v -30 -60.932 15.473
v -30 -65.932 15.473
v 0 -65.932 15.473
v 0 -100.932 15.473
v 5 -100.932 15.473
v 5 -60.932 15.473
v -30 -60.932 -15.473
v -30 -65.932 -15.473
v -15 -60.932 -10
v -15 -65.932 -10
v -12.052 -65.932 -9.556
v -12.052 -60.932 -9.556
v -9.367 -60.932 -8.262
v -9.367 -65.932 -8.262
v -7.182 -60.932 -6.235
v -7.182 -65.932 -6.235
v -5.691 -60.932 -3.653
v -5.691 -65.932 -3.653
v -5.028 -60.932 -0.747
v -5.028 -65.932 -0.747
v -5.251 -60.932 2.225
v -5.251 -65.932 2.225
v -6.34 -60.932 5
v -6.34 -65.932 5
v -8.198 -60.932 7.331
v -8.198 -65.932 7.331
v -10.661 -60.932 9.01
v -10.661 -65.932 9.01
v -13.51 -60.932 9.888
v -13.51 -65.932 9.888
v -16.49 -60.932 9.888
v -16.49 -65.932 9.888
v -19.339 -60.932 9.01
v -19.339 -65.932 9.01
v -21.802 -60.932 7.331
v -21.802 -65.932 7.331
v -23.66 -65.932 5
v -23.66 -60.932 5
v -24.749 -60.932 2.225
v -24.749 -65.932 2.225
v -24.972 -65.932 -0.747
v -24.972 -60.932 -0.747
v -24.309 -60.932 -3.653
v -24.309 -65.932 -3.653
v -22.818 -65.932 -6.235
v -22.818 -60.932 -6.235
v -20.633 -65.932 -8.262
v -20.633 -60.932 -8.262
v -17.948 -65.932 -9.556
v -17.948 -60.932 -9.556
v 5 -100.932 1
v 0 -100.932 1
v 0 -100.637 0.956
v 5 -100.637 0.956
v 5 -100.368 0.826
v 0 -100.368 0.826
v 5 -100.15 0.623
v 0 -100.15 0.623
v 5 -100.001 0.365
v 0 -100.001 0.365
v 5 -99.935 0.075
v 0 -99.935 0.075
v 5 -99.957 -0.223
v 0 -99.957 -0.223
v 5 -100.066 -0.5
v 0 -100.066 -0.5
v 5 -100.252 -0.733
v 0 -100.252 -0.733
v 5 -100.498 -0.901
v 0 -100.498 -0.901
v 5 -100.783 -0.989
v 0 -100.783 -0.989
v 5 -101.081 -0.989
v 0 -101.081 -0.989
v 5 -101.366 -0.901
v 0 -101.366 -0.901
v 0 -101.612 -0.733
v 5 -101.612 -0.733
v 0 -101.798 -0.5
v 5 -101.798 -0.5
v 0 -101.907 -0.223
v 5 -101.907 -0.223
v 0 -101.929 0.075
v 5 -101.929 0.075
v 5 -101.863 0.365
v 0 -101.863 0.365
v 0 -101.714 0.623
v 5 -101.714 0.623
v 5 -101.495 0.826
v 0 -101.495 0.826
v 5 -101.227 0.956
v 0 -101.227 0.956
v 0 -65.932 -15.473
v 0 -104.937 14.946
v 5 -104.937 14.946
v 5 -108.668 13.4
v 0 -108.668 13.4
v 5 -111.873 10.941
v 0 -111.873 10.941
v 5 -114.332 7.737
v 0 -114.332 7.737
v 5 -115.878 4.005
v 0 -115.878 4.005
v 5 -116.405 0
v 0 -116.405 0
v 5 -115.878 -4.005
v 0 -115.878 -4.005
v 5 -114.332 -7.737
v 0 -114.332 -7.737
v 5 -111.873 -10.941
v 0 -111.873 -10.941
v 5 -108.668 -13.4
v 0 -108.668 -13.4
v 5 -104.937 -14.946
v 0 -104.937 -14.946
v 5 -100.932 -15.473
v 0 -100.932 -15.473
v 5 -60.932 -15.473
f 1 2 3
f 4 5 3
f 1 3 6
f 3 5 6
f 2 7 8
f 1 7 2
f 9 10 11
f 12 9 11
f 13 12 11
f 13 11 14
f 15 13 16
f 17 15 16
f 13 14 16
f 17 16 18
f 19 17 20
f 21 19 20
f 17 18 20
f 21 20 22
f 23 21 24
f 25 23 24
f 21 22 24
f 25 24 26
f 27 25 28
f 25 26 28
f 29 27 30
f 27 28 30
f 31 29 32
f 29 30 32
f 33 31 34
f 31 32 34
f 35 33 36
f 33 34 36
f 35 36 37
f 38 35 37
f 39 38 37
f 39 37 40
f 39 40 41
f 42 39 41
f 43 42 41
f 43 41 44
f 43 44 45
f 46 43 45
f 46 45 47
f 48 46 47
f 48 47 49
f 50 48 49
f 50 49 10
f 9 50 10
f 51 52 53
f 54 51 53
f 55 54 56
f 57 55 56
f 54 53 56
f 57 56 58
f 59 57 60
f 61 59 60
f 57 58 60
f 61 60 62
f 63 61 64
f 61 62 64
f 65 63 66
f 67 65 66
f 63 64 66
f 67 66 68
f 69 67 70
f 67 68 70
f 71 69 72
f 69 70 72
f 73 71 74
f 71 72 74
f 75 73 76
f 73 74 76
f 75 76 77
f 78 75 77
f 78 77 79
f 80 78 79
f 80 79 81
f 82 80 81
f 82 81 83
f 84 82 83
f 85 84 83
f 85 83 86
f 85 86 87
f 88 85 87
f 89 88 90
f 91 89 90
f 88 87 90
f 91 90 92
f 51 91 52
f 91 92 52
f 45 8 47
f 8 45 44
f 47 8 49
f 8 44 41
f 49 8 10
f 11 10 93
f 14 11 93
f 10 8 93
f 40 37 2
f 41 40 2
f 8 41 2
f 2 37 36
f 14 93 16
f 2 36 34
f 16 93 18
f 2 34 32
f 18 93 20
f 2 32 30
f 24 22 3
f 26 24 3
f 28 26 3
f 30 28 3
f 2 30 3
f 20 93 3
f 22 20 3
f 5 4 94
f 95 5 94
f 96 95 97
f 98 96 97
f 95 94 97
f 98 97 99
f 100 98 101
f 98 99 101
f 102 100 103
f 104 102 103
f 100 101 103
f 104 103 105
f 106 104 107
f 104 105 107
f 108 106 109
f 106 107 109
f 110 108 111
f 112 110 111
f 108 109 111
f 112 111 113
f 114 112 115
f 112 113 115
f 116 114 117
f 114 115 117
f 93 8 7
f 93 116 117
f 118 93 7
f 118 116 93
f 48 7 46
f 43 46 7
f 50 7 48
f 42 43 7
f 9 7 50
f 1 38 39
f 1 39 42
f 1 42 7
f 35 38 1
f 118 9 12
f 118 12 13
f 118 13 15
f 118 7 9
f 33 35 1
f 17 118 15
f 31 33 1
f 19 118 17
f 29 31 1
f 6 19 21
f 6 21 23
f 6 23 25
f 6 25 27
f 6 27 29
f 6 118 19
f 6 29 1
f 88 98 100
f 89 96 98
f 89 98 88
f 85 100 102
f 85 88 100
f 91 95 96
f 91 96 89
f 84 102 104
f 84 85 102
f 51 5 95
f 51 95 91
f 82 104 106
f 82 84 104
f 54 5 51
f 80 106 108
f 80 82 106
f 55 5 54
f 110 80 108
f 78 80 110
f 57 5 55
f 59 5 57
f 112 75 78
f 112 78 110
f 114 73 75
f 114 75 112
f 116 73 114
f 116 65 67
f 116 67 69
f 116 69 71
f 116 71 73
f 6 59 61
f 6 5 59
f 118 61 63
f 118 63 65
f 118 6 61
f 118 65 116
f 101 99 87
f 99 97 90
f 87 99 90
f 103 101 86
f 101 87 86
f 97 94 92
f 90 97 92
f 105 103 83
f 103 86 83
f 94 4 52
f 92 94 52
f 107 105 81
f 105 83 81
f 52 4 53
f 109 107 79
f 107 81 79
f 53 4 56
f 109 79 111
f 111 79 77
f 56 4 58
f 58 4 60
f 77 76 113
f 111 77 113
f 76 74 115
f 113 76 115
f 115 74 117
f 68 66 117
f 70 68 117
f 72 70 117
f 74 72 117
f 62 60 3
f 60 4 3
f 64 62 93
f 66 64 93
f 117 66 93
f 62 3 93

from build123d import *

# Parameters (mm, degrees)
BOSS_EXTRUDE2_DEPTH = 5
SKETCH5_R           = 1
CUT_EXTRUDE2_DEPTH  = 5
SKETCH6_W           = 30.946174702
SKETCH6_H           = 5
BOSS_EXTRUDE3_DEPTH = 30
SKETCH10_R          = 10
CUT_EXTRUDE3_DEPTH  = 30


with BuildPart() as part:
    # Sketch3 → Boss-Extrude2 (new body)
    with BuildSketch(Plane(origin=(0, 0, 0), x_dir=(0, 0, -1), z_dir=(1, 0, 0))):
        with BuildLine():
            Line((15.473087351, -60.931791337), (-15.473087351, -60.931791337))
            Line((-15.473087351, -60.931791337), (-15.473087351, -100.931791337))
            ThreePointArc((-15.473087351, -100.931791337), (0, -116.404878688), (15.473087351, -100.931791337))
            Line((15.473087351, -100.931791337), (15.473087351, -60.931791337))
        make_face()
    extrude(amount=BOSS_EXTRUDE2_DEPTH)

    # Sketch5 → Cut-Extrude2 (cut)
    with BuildSketch(Plane.ZY):
        with Locations((0, -100.931791337)):
            Circle(SKETCH5_R)
    extrude(amount=-CUT_EXTRUDE2_DEPTH, mode=Mode.SUBTRACT)

    # Sketch6 → Boss-Extrude3 (add)
    with BuildSketch(Plane.ZY):
        with Locations((0, -63.431791337)):
            Rectangle(SKETCH6_W, SKETCH6_H)
    extrude(amount=BOSS_EXTRUDE3_DEPTH)

    # Sketch10 → Cut-Extrude3 (cut)
    with BuildSketch(Plane.XZ.offset(65.931791337)):
        with Locations(Location((-15, 0, 0), (0, 0, 270))):
            Circle(SKETCH10_R)
    extrude(amount=-CUT_EXTRUDE3_DEPTH, mode=Mode.SUBTRACT)


solid = part.part
